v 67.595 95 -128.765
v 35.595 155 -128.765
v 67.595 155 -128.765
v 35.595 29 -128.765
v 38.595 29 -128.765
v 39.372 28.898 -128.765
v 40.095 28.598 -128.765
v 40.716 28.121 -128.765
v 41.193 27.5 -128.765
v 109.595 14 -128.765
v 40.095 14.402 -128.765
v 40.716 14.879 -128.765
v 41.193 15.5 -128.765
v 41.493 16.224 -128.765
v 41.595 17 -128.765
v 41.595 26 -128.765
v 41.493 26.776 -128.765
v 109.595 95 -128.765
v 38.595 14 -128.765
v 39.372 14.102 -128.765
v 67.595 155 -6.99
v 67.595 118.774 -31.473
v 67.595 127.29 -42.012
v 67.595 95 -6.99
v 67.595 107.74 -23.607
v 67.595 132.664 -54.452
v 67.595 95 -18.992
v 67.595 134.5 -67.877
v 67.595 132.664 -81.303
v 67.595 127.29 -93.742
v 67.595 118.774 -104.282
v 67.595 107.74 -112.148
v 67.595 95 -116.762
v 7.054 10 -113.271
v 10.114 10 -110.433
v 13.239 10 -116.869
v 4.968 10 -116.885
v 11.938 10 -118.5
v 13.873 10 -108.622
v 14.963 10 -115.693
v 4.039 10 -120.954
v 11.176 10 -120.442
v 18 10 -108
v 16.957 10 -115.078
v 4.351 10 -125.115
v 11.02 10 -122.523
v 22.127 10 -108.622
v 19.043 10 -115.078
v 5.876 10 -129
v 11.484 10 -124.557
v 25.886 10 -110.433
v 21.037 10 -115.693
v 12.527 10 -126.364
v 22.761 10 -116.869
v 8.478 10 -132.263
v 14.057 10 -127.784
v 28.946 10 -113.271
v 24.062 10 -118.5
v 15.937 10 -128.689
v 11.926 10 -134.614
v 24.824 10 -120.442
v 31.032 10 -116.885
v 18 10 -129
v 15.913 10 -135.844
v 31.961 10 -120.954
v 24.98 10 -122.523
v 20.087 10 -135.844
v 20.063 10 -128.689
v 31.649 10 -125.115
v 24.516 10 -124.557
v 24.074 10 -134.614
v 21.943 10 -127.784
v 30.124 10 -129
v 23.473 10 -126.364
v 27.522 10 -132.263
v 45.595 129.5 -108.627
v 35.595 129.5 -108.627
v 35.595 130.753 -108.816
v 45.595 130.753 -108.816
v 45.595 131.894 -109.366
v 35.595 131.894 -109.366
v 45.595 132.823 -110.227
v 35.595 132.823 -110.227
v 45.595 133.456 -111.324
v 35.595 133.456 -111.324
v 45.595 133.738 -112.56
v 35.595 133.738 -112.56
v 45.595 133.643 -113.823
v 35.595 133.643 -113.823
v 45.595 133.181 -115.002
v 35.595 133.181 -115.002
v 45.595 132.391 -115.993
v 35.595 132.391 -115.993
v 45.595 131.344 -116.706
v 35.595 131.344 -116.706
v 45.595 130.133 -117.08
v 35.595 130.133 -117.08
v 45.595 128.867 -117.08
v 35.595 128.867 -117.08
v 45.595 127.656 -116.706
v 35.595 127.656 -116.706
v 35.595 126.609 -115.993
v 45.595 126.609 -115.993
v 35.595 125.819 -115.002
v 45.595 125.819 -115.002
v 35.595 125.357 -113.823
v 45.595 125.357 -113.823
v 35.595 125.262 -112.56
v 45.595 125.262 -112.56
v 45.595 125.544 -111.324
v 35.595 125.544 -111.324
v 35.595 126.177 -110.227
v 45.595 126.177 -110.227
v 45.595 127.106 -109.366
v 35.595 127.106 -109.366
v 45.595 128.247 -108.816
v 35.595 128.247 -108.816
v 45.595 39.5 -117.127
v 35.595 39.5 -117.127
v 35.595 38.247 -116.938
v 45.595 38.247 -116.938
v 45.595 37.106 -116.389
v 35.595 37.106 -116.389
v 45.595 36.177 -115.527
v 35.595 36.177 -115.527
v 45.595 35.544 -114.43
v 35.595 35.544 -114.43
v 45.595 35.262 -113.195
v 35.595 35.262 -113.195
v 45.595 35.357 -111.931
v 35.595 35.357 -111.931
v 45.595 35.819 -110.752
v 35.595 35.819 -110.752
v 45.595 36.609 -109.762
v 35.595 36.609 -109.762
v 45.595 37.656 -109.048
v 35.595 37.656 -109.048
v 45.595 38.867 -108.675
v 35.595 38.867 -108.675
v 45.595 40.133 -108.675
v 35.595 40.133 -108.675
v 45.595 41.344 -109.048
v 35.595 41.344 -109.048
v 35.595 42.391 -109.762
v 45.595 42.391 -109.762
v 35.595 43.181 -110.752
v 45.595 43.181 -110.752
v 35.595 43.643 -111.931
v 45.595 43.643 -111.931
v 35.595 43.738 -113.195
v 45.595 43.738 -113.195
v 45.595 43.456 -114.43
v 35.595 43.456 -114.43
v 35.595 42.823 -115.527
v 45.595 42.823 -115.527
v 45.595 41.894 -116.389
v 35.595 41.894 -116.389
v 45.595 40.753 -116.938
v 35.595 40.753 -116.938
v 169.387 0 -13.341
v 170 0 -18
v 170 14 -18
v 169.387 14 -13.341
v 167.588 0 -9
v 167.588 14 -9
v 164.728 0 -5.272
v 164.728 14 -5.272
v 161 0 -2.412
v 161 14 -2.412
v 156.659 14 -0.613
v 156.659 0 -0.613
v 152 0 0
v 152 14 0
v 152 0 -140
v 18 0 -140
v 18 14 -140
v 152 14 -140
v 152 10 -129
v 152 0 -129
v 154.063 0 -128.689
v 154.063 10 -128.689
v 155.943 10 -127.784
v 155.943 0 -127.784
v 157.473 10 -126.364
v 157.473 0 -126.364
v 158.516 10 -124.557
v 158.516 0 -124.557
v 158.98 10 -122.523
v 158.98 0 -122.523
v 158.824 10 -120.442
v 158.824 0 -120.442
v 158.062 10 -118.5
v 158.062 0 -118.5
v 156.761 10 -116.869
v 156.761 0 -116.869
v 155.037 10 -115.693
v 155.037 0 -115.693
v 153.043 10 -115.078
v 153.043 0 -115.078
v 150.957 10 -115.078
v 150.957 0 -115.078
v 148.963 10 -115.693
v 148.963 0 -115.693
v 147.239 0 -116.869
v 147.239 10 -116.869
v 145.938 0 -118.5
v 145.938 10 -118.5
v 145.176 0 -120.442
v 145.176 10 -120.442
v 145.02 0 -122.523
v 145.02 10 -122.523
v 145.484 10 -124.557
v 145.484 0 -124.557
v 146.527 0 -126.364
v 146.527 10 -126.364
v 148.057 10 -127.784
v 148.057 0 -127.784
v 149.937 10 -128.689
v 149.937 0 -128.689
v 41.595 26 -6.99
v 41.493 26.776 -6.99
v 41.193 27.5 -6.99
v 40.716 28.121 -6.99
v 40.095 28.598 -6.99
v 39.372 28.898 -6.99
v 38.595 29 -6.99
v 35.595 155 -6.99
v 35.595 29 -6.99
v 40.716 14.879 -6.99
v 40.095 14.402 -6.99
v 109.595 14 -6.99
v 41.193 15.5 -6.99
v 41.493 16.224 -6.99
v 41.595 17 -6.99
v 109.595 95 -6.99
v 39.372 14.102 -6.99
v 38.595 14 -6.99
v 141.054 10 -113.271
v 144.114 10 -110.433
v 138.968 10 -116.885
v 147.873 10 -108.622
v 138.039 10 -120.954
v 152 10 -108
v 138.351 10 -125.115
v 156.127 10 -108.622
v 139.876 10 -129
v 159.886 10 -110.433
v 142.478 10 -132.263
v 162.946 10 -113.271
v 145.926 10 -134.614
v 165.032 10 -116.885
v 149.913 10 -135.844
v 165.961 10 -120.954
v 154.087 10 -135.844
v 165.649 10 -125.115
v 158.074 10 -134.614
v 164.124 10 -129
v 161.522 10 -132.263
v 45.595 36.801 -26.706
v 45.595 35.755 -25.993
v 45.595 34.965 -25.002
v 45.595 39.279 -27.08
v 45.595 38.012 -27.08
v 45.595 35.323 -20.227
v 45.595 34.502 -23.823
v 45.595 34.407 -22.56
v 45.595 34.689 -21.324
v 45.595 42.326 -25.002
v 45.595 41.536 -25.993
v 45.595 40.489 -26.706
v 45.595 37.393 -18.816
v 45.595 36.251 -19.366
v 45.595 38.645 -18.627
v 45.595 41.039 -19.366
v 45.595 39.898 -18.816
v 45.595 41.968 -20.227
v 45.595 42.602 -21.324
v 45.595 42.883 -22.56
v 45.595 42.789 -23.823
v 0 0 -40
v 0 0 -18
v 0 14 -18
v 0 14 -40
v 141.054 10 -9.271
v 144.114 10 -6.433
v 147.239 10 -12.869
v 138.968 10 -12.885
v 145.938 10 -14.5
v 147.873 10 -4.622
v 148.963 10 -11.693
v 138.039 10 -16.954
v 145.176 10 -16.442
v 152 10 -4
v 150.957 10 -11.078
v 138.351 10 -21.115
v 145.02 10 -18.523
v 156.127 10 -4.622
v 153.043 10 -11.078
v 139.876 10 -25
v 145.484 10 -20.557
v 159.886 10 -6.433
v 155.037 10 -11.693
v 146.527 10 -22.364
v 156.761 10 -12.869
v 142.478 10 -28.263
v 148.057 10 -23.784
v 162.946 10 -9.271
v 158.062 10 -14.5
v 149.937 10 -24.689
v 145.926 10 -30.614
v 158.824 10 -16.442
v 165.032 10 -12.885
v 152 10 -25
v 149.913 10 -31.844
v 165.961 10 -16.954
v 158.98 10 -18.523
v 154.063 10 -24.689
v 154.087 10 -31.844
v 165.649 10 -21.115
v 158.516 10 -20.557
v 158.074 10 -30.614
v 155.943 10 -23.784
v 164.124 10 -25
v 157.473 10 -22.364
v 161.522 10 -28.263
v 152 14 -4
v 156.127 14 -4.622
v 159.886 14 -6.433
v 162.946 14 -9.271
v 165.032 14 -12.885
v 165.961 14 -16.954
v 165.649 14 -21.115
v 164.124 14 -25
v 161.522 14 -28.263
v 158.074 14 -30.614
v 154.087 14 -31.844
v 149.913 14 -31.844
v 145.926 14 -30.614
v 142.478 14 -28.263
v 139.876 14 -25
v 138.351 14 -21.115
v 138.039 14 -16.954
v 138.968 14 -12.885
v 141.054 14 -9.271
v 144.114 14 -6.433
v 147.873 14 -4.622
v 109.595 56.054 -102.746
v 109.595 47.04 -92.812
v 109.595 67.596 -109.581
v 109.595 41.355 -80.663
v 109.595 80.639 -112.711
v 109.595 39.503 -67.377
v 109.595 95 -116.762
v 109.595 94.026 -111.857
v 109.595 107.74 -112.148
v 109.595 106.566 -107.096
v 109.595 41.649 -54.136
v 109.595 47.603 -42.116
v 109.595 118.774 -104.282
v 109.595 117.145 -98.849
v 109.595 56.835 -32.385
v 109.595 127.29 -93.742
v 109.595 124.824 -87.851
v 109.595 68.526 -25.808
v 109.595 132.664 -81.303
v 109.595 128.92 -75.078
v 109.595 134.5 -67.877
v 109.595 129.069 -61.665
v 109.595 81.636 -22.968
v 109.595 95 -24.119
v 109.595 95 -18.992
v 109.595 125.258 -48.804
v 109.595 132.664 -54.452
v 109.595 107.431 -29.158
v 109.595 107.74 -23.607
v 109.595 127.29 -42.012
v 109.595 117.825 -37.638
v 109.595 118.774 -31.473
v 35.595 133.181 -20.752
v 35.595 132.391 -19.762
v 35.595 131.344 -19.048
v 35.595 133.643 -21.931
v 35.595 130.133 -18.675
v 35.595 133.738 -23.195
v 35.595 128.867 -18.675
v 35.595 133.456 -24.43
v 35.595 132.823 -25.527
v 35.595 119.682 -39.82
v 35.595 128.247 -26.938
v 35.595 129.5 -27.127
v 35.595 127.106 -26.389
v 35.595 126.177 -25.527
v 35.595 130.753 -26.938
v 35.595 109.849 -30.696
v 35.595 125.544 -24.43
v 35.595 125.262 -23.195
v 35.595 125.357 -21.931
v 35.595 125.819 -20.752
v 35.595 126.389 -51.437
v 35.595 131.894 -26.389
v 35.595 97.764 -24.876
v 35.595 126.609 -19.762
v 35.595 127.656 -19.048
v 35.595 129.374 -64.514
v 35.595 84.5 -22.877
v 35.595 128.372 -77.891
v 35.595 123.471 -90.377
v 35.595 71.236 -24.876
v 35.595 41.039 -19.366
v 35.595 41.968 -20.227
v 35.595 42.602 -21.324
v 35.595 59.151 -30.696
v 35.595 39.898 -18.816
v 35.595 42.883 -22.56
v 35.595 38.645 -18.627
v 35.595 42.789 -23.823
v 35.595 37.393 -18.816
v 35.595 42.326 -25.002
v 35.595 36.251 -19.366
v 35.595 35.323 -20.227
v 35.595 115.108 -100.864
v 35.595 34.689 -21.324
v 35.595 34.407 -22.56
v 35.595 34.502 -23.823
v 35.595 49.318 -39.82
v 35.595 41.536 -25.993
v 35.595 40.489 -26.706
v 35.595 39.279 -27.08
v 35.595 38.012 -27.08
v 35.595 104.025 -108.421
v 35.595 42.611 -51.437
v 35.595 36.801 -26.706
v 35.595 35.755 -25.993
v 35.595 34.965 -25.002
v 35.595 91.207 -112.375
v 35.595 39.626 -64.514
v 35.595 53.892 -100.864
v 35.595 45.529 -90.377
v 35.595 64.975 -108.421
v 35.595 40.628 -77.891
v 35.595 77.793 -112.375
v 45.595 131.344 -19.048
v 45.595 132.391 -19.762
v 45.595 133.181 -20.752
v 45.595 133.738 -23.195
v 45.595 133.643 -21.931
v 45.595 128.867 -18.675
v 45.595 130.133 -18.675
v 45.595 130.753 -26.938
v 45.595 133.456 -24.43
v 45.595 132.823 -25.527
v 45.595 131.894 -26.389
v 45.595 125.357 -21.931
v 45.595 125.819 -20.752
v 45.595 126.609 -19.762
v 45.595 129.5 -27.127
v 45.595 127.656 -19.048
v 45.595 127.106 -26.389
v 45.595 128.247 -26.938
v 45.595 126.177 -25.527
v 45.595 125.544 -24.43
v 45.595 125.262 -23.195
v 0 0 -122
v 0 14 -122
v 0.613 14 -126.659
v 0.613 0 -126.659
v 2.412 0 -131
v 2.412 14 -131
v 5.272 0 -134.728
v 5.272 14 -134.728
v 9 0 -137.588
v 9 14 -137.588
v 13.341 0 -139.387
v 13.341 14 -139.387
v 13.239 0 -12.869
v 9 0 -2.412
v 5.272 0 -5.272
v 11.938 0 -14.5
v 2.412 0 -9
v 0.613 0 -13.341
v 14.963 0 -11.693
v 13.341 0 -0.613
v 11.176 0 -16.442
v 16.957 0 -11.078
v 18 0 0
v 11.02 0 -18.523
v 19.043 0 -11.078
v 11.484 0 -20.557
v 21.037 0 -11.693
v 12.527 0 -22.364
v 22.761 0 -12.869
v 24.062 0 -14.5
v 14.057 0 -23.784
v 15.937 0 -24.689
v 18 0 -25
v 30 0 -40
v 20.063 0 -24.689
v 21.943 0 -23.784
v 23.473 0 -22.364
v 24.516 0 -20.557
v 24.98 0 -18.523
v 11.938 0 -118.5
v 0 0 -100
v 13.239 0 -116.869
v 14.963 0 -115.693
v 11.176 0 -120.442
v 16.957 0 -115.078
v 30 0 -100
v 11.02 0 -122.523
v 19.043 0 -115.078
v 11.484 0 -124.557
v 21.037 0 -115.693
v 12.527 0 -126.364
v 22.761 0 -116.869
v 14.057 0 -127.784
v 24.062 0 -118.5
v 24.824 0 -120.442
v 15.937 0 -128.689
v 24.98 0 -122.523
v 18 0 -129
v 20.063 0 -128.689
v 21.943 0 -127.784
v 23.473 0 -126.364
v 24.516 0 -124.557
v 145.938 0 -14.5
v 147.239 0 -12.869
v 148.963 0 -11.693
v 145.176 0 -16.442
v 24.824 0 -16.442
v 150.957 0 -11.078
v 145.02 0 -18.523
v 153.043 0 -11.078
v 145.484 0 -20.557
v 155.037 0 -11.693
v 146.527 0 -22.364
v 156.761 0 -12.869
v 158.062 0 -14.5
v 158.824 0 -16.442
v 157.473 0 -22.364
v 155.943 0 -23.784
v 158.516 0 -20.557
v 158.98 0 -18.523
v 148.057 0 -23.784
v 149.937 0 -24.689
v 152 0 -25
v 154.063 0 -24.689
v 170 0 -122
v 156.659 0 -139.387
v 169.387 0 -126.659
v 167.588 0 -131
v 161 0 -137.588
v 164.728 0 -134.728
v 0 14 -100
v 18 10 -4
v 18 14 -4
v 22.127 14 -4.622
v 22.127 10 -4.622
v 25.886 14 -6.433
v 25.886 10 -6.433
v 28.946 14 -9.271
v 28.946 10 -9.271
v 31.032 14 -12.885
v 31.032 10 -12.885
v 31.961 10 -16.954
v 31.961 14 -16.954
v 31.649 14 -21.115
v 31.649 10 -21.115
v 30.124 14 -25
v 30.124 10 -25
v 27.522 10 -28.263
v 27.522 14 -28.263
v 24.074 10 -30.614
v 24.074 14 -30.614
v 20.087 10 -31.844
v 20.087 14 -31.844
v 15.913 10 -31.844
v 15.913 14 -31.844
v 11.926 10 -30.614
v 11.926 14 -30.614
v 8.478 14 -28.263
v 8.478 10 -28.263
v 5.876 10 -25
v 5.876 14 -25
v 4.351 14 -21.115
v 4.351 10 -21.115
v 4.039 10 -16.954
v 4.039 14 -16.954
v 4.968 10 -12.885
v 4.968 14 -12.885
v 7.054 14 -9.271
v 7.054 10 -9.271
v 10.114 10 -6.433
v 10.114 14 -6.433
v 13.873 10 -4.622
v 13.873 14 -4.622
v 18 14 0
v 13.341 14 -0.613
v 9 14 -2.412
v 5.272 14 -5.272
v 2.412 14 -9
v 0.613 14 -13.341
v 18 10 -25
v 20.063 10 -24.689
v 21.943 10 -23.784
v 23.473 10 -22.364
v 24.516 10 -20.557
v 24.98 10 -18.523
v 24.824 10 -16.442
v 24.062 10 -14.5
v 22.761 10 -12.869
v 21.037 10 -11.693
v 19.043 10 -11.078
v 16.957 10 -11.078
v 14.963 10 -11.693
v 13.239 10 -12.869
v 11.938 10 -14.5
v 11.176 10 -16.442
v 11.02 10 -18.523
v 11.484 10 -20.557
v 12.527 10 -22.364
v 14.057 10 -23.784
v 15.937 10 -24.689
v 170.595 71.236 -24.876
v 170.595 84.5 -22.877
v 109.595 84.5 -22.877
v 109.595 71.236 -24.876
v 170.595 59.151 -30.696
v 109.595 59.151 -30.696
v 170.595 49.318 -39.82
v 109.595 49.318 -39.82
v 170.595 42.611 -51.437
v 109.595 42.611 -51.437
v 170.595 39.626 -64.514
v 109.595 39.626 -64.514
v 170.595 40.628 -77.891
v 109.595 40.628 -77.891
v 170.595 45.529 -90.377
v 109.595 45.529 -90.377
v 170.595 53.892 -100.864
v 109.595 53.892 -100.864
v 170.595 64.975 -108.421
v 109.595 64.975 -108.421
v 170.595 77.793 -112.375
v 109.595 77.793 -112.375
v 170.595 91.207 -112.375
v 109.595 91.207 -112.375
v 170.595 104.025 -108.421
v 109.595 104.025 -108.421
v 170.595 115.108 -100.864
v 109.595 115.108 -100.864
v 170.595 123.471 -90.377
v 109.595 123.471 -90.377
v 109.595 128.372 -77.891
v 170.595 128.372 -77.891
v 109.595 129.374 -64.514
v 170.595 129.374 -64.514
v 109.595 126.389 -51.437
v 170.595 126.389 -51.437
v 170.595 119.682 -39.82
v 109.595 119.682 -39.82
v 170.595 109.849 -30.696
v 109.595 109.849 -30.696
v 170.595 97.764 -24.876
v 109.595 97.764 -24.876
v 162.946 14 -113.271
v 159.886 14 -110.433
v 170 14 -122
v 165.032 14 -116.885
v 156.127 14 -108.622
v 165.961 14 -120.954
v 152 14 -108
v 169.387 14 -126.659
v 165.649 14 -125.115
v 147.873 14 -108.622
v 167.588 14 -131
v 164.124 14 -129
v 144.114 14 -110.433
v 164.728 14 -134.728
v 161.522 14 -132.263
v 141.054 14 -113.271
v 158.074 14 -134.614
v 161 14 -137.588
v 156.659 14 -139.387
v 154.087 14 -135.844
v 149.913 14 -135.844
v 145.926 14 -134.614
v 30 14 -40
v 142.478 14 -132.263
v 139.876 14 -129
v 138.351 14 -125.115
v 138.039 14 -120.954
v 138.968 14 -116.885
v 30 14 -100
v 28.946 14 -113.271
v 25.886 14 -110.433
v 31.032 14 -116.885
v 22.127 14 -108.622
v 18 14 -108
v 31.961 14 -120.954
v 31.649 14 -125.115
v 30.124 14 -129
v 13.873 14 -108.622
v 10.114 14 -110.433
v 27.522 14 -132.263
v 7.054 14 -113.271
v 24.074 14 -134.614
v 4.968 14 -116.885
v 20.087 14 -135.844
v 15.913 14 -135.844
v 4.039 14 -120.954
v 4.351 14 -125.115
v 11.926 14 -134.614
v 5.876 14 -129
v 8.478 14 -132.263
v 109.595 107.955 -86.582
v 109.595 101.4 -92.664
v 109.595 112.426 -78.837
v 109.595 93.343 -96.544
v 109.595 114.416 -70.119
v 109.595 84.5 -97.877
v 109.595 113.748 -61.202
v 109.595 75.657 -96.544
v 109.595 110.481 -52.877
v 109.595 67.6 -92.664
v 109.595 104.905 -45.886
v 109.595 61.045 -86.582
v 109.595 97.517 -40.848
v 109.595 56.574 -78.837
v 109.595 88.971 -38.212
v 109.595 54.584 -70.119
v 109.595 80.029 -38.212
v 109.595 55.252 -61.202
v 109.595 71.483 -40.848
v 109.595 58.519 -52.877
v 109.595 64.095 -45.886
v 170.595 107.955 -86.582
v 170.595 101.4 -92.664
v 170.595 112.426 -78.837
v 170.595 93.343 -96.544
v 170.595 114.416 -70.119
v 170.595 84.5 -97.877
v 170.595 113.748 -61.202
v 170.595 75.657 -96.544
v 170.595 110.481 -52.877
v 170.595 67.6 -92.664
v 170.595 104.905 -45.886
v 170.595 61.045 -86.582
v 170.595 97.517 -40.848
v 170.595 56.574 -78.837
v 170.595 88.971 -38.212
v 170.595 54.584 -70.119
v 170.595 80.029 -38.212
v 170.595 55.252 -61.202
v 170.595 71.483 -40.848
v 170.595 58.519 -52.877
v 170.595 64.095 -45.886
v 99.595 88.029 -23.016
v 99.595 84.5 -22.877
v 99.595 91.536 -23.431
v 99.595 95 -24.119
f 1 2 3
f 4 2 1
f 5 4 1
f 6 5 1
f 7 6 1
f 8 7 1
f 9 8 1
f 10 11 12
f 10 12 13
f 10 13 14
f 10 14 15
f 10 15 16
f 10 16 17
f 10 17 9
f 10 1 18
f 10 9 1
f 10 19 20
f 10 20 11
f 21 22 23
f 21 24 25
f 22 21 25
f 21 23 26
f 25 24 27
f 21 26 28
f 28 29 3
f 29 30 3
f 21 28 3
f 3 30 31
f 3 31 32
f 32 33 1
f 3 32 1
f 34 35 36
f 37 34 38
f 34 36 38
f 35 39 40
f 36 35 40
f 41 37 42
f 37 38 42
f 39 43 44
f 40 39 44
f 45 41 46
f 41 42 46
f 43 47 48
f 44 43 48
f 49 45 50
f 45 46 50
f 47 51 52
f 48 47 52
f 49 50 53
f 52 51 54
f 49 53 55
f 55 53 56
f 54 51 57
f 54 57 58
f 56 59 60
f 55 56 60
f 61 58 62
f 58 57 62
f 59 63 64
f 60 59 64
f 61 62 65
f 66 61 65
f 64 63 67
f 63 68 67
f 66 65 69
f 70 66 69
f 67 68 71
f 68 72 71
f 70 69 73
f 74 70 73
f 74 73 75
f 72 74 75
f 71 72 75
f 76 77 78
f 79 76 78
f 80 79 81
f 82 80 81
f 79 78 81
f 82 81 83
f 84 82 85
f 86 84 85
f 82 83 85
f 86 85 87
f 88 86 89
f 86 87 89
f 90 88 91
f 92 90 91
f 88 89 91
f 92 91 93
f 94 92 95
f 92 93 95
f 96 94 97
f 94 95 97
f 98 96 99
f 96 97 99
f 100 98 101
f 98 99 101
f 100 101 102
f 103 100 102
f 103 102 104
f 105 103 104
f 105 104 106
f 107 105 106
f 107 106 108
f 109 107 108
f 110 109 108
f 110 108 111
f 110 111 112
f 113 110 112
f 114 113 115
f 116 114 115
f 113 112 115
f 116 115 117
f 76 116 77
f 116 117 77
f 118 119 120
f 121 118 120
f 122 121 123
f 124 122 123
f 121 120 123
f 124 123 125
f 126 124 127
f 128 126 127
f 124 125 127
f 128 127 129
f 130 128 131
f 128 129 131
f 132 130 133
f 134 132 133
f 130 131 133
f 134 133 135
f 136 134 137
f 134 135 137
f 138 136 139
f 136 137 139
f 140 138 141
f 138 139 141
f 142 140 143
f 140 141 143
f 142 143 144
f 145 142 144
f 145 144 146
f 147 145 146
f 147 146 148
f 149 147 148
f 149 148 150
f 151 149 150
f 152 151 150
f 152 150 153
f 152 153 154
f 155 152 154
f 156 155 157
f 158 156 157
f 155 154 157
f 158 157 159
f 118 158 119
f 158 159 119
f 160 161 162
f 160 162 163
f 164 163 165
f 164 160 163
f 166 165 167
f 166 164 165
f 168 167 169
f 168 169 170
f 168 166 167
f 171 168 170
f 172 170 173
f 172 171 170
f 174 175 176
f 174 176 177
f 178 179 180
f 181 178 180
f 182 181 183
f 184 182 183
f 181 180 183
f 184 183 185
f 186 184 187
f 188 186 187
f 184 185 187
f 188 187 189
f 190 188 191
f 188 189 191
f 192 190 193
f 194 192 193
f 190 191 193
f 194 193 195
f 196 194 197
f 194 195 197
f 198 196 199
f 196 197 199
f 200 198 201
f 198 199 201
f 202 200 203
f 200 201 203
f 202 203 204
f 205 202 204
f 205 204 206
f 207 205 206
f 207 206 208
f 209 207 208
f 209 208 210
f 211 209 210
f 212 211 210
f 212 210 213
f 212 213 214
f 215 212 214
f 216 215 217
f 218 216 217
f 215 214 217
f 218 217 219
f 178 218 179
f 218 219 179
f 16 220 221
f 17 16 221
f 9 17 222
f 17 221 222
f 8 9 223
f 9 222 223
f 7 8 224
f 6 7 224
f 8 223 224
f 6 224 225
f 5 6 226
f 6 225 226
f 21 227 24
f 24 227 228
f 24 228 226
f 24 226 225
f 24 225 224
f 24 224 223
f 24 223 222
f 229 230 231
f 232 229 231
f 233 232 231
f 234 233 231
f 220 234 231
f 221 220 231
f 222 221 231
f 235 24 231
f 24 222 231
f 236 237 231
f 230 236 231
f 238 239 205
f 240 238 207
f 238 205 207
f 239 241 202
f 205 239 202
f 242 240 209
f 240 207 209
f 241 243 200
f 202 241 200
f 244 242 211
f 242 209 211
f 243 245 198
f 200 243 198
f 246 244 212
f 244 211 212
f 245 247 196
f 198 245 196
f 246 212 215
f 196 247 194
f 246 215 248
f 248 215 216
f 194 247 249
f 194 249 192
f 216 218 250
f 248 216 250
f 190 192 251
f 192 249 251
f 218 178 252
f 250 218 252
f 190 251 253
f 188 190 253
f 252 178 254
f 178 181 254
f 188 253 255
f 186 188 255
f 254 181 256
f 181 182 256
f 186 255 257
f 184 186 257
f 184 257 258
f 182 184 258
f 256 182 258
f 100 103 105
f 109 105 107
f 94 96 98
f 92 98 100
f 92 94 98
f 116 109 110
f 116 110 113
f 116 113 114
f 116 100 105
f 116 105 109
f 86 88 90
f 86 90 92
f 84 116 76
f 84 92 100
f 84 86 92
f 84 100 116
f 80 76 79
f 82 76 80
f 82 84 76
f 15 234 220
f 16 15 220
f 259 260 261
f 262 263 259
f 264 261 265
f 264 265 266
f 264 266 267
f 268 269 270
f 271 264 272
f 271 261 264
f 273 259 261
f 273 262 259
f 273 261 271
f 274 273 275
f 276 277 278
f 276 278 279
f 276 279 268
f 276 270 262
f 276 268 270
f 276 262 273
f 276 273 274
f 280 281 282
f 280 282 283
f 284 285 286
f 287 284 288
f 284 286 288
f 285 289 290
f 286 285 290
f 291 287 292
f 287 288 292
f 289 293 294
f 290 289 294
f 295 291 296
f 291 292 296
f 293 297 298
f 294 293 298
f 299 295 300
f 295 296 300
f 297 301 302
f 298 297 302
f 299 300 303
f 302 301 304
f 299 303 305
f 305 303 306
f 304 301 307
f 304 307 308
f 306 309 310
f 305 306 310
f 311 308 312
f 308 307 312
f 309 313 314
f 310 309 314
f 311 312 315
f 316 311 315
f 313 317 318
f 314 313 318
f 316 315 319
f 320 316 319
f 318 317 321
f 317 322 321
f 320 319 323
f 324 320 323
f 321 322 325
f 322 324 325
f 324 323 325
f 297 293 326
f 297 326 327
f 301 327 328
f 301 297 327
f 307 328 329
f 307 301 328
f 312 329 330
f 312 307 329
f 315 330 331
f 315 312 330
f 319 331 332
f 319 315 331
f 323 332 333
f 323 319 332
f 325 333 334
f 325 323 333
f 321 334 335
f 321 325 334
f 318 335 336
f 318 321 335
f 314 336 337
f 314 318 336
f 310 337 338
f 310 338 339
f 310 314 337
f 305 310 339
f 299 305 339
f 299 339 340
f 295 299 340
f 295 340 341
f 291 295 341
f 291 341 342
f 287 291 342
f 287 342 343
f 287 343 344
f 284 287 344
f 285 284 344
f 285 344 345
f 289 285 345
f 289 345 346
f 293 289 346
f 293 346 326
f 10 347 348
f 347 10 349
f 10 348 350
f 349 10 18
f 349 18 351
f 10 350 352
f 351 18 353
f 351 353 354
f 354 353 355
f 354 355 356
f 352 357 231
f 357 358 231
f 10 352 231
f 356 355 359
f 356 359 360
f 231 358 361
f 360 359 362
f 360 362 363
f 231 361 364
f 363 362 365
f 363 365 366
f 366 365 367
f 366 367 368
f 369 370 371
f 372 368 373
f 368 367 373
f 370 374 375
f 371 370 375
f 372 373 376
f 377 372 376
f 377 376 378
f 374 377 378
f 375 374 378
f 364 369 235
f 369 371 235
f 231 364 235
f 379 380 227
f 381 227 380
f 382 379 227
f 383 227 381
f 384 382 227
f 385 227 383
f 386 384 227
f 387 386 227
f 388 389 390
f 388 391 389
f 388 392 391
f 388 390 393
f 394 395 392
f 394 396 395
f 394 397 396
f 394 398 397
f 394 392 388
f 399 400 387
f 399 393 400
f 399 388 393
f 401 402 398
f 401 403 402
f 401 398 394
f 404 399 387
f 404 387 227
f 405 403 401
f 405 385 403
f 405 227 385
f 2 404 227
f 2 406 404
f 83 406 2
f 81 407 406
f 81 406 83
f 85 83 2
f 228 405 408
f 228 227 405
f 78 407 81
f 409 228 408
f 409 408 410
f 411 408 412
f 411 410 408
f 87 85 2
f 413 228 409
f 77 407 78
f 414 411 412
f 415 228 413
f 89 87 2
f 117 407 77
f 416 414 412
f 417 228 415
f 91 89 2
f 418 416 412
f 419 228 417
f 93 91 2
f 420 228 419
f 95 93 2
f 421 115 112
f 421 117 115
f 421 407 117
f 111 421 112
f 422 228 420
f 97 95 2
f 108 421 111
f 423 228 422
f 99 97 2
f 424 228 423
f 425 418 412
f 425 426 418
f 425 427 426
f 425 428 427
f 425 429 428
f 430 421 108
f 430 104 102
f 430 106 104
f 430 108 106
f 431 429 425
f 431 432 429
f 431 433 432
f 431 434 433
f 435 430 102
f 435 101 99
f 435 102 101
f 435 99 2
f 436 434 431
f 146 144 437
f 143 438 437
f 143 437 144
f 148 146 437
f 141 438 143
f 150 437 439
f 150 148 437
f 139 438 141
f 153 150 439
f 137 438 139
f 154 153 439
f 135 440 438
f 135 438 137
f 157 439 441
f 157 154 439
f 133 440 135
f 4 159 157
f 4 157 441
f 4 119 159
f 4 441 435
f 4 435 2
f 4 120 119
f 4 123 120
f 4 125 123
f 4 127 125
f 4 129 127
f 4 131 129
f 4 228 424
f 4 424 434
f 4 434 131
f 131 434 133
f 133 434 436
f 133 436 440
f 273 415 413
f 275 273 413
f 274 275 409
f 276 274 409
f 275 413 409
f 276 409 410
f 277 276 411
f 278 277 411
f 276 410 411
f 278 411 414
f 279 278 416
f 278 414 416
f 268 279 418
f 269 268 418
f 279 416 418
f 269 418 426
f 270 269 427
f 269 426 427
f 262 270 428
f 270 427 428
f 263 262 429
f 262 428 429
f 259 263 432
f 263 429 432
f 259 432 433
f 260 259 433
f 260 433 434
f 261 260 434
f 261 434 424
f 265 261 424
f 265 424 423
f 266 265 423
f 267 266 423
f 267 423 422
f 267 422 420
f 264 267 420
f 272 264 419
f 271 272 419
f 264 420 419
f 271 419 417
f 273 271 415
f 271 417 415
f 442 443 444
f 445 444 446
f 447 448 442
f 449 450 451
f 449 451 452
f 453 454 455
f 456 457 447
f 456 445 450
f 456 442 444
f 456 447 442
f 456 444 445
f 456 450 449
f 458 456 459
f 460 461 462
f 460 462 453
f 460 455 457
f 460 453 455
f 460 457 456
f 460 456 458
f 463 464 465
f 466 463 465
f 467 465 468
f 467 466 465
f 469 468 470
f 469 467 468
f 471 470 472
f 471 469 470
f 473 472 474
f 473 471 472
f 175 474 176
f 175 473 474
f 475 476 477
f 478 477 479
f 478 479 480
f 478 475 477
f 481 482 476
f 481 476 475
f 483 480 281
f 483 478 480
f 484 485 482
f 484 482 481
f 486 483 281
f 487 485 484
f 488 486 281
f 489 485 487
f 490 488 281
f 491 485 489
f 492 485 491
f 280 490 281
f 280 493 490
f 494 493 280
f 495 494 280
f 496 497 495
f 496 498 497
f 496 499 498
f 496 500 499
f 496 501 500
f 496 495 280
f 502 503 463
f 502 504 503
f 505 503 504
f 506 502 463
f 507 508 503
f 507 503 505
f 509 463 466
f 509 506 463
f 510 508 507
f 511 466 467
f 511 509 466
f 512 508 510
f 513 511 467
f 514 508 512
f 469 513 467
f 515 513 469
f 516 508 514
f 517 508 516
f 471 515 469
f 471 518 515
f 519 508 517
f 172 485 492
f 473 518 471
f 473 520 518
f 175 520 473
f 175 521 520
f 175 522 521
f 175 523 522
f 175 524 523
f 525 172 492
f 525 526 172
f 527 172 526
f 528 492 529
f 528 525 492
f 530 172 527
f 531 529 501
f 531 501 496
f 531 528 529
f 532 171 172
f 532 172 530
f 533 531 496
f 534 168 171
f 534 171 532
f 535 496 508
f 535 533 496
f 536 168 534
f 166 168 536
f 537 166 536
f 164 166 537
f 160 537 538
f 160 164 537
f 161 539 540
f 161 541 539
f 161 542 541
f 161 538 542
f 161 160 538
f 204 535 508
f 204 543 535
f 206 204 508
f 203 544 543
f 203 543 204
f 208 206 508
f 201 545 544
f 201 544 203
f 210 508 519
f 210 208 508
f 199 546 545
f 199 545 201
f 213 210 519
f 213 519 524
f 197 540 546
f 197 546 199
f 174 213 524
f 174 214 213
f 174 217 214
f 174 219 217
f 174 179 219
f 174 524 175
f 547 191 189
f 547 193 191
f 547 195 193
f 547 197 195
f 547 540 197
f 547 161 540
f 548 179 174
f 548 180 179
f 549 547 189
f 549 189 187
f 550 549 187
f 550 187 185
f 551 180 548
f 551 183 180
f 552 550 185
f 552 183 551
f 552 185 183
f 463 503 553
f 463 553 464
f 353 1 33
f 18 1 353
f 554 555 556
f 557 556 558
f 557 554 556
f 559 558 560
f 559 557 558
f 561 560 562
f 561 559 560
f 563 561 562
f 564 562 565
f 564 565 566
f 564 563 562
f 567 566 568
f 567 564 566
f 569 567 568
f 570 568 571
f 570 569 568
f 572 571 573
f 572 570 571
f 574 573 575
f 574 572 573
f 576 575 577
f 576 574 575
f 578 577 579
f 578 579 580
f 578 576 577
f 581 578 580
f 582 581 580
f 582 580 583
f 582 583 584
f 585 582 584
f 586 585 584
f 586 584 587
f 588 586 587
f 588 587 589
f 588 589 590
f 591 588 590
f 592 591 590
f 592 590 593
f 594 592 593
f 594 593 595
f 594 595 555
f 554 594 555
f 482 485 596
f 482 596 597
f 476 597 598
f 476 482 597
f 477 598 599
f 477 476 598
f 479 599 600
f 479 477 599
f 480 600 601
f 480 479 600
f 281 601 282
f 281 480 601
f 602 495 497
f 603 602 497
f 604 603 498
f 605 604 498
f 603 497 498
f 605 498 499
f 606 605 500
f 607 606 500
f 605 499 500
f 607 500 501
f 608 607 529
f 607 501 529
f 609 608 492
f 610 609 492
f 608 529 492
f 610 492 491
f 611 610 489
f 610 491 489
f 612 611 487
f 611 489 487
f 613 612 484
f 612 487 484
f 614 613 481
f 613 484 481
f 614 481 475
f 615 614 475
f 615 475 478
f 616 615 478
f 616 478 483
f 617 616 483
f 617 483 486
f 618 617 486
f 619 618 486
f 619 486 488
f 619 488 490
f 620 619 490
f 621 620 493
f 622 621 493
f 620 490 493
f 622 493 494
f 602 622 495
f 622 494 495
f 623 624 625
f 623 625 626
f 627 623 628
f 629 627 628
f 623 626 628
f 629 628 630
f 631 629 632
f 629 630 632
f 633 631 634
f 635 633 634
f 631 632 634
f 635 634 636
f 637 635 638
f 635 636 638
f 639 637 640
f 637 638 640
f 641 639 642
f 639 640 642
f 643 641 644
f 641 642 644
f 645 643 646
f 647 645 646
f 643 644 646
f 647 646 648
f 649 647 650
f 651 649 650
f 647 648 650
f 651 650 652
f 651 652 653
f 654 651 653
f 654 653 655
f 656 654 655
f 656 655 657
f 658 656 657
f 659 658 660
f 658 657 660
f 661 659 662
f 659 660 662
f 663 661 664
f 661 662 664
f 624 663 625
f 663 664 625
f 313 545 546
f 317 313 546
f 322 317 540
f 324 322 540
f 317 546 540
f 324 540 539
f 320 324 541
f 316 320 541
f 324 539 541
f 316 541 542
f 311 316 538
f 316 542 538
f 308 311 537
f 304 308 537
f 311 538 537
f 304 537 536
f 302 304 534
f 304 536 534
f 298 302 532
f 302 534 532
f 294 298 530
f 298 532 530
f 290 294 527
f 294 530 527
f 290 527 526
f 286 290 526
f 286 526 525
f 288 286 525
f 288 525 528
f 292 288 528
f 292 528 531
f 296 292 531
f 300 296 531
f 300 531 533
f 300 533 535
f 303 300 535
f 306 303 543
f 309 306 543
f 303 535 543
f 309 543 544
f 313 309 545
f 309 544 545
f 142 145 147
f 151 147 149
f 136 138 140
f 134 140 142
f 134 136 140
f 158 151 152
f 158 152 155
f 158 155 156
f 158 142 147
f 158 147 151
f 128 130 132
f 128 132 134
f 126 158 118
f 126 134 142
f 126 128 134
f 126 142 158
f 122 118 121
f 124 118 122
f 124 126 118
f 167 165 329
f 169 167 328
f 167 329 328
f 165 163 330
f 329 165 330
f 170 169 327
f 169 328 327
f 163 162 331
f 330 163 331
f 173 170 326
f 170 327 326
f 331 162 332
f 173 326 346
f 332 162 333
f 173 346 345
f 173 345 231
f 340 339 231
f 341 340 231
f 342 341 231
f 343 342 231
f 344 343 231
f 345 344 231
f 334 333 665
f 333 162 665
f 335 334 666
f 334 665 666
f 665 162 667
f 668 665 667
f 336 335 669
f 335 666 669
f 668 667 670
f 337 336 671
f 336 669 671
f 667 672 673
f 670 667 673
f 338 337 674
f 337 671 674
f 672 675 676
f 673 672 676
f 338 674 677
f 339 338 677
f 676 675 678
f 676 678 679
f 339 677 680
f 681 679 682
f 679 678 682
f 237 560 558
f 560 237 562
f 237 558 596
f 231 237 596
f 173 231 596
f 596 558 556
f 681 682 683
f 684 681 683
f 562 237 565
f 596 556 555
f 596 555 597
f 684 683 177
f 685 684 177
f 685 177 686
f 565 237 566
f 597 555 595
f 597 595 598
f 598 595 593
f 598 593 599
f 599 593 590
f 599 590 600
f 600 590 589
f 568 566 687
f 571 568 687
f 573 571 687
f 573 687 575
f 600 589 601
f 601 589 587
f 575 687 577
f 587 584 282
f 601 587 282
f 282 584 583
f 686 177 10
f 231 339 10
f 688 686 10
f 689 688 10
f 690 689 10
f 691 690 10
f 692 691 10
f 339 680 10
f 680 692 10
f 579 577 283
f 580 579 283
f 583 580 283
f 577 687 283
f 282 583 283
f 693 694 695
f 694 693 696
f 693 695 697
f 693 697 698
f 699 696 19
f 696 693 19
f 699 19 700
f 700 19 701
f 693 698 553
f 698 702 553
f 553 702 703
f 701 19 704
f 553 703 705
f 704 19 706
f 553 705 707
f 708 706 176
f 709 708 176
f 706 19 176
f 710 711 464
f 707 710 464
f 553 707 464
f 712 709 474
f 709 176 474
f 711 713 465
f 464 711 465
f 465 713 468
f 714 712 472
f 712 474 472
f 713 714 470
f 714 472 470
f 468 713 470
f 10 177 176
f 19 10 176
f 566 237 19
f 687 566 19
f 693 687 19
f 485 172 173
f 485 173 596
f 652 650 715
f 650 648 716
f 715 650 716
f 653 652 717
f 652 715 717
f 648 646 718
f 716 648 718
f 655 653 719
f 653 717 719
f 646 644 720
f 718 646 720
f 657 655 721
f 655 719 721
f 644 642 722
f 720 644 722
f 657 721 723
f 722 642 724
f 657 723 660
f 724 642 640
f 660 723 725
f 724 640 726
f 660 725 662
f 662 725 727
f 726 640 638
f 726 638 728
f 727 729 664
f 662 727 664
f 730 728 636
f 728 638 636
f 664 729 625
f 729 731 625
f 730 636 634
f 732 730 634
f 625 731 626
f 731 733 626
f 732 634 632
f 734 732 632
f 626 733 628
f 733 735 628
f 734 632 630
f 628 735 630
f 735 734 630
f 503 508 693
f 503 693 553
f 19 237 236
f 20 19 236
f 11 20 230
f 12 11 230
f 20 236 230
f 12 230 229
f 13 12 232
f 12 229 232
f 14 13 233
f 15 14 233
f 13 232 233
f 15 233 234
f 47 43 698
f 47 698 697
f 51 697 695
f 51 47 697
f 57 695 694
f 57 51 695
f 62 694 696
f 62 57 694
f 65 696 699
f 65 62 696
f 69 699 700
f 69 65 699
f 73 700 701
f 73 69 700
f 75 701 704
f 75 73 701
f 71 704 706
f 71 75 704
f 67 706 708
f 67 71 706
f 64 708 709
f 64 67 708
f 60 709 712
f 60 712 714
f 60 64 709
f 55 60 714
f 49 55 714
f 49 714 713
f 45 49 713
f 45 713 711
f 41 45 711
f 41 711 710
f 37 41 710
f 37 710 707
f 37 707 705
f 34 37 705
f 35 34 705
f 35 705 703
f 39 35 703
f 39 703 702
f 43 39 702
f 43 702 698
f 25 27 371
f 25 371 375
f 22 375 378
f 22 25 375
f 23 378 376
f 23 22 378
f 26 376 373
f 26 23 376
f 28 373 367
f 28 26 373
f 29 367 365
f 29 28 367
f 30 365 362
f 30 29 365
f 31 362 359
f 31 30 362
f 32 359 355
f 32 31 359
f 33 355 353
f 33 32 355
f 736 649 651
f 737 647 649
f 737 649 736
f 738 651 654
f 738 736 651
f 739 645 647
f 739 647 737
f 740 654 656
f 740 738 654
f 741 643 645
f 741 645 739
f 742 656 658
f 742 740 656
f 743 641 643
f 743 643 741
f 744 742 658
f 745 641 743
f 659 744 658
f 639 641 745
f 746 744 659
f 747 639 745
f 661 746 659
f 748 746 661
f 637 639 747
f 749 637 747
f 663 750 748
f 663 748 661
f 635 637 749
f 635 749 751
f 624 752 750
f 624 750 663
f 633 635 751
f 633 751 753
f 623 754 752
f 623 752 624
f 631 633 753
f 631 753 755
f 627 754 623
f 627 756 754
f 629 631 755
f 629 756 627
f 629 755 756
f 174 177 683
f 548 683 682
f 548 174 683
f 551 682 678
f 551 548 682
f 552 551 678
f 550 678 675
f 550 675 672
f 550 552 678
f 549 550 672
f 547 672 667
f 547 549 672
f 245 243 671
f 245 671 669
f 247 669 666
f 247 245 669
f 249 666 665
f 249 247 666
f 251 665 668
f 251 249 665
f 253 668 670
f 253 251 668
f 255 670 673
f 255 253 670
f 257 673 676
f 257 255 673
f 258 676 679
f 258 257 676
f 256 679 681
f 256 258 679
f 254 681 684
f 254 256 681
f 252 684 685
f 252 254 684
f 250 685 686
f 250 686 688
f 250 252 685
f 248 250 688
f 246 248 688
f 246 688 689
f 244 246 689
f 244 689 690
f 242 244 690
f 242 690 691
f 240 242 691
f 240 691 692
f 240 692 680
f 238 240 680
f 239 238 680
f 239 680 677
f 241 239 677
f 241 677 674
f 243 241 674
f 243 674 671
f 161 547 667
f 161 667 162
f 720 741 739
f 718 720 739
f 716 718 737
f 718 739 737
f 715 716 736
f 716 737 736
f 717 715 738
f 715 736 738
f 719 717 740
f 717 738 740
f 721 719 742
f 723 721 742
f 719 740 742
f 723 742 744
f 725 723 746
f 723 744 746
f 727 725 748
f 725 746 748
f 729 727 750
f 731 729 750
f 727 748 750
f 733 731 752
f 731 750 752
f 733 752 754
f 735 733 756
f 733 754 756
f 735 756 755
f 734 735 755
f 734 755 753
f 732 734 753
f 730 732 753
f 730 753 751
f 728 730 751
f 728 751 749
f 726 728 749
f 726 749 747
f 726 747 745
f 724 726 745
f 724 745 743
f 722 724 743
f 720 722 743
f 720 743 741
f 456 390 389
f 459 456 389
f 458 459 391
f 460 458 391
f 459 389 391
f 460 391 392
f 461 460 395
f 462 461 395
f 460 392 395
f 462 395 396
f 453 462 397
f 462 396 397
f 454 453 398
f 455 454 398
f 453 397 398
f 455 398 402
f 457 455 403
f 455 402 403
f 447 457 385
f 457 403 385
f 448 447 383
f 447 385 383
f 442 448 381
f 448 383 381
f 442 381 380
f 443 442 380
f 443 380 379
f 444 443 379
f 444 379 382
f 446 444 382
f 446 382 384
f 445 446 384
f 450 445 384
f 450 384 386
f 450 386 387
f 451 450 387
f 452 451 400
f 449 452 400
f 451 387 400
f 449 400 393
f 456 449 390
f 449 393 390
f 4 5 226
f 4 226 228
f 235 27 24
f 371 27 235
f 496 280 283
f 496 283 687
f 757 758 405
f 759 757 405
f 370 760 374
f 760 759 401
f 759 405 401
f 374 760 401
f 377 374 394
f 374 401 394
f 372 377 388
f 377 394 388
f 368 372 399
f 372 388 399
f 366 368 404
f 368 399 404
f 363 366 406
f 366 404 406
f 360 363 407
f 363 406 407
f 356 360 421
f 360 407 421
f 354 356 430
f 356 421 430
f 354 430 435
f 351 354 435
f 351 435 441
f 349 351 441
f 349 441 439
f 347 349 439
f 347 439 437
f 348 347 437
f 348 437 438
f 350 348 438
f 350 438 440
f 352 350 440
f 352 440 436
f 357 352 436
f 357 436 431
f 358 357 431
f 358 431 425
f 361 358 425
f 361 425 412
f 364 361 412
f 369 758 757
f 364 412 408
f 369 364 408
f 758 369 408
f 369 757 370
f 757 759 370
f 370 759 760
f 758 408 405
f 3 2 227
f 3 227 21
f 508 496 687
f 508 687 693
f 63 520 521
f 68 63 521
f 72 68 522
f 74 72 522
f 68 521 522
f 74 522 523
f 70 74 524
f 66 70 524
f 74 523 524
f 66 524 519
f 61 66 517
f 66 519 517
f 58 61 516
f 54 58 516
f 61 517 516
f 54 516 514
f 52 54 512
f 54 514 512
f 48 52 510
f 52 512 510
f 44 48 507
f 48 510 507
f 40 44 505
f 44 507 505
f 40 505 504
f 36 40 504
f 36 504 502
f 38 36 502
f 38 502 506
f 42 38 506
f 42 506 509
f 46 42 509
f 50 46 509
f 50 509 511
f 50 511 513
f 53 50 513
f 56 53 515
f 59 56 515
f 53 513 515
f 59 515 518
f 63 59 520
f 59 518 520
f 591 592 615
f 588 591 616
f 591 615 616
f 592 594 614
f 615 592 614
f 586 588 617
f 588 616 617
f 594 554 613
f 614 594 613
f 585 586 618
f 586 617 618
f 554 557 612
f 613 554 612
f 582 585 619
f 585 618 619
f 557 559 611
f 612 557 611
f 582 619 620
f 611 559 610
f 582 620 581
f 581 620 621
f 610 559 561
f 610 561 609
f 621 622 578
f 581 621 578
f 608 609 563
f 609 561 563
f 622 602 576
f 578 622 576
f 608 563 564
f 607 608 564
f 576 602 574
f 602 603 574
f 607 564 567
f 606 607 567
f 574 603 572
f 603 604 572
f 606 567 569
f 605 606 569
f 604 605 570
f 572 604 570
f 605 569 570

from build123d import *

# Parameters (mm, degrees)
SKETCH1_R            = 14
BOSS_EXTRUDE2_DEPTH  = 14
SKETCH5_W            = 32
SKETCH5_H            = 121.775184507
BOSS_EXTRUDE4_DEPTH  = 141
SKETCH7_W            = 42
SKETCH7_H            = 121.775184507
BOSS_EXTRUDE5_DEPTH  = 81
SKETCH8_R            = 45
CUT_EXTRUDE1_DEPTH   = 81
SKETCH9_R            = 50
CUT_EXTRUDE2_DEPTH   = 64
SKETCH10_R           = 50
SKETCH10_R_2         = 45
BOSS_EXTRUDE7_DEPTH  = 74
SKETCH12_R           = 45
BOSS_EXTRUDE8_DEPTH  = 61
SKETCH14_R           = 30
CUT_EXTRUDE3_DEPTH   = 108
CUT_EXTRUDE10_DEPTH  = 151
SKETCH21_R           = 4.25
CUT_EXTRUDE11_DEPTH  = 10
SKETCH22_R           = 14
SKETCH22_R_2         = 7
BOSS_EXTRUDE11_DEPTH = 10


with BuildPart() as part:
    # Sketch1 → Boss-Extrude2 (new body)
    with BuildSketch(Plane(origin=(0, 0, 0), x_dir=(1, 0, 0), z_dir=(0, 1, 0))):
        with BuildLine():
            ThreePointArc((152, 140), (164.727922061, 134.727922061), (170, 122))
            Line((170, 122), (170, 18))
            ThreePointArc((170, 18), (164.727922061, 5.272077939), (152, 0))
            Line((152, 0), (18, 0))
            ThreePointArc((18, 0), (5.272077939, 5.272077939), (0, 18))
            Line((0, 18), (0, 40))
            Line((0, 40), (30, 40))
            Line((30, 40), (30, 100))
            Line((30, 100), (0, 100))
            Line((0, 100), (0, 122))
            ThreePointArc((0, 122), (5.272077939, 134.727922061), (18, 140))
            Line((18, 140), (152, 140))
        make_face()
        with Locations(Location((18, 18, 0), (0, 0, 270))):
            Circle(SKETCH1_R, mode=Mode.SUBTRACT)
        with Locations(Location((152, 18, 0), (0, 0, 270))):
            Circle(SKETCH1_R, mode=Mode.SUBTRACT)
        with Locations(Location((152, 122, 0), (0, 0, 270))):
            Circle(SKETCH1_R, mode=Mode.SUBTRACT)
        with Locations(Location((18, 122, 0), (0, 0, 270))):
            Circle(SKETCH1_R, mode=Mode.SUBTRACT)
    extrude(amount=BOSS_EXTRUDE2_DEPTH)

    # Sketch5 → Boss-Extrude4 (add)
    with BuildSketch(Plane(origin=(0, 14, 0), x_dir=(1, 0, 0), z_dir=(0, 1, 0))):
        with Locations((51.595170786, 67.877136245)):
            Rectangle(SKETCH5_W, SKETCH5_H)
    extrude(amount=BOSS_EXTRUDE4_DEPTH)

    # Sketch7 → Boss-Extrude5 (add)
    with BuildSketch(Plane(origin=(0, 14, 0), x_dir=(1, 0, 0), z_dir=(0, 1, 0))):
        with Locations((88.595170786, 67.877136245)):
            Rectangle(SKETCH7_W, SKETCH7_H)
    extrude(amount=BOSS_EXTRUDE5_DEPTH)

    # Sketch8 → Cut-Extrude1 (cut)
    with BuildSketch(Plane.ZY.offset(-35.595170786)):
        with Locations((-67.877136245, 84.5)):
            Circle(SKETCH8_R)
    extrude(amount=-CUT_EXTRUDE1_DEPTH, mode=Mode.SUBTRACT)

    # Sketch9 → Cut-Extrude2 (cut)
    with BuildSketch(Plane.ZY.offset(-35.595170786)):
        with Locations((-67.877136245, 84.5)):
            Circle(SKETCH9_R)
    extrude(amount=-CUT_EXTRUDE2_DEPTH, mode=Mode.SUBTRACT)

    # Sketch10 → Boss-Extrude7 (add)
    with BuildSketch(Plane.ZY.offset(-35.595170786)):
        with Locations((-67.877136245, 84.5)):
            Circle(SKETCH10_R)
        with Locations((-67.877136245, 84.5)):
            Circle(SKETCH10_R_2, mode=Mode.SUBTRACT)
    extrude(amount=-BOSS_EXTRUDE7_DEPTH)

    # Sketch16 → Cut-Extrude10 (cut)
    with BuildSketch(Plane.XY.offset(-6.989543991)):
        with BuildLine():
            Line((41.595170786, 17), (41.595170786, 26))
            ThreePointArc((41.595170786, 26), (40.71649113, 28.121320344), (38.595170786, 29))
            Line((38.595170786, 29), (35.595170786, 29))
            Line((35.595170786, 29), (35.595170786, 14))
            Line((35.595170786, 14), (38.595170786, 14))
            ThreePointArc((38.595170786, 14), (40.71649113, 14.878679656), (41.595170786, 17))
        make_face()
    extrude(amount=-CUT_EXTRUDE10_DEPTH, mode=Mode.SUBTRACT)

    # Sketch21 → Cut-Extrude11 (cut)
    with BuildSketch(Plane.ZY.offset(-35.595170786)):
        with Locations((-112.877136245, 129.5)):
            Circle(SKETCH21_R)
        with Locations(Location((-112.877136245, 39.5, 0), (0, 0, 180))):
            Circle(SKETCH21_R)
        with Locations((-22.877136245, 38.645340566)):
            Circle(SKETCH21_R)
        with Locations(Location((-22.877136245, 129.5, 0), (0, 0, 180))):
            Circle(SKETCH21_R)
    extrude(amount=-CUT_EXTRUDE11_DEPTH, mode=Mode.SUBTRACT)

    # Sketch22 → Boss-Extrude11 (add)
    # profile 1 of 4: a face of its own
    with BuildSketch(Plane.XZ):
        with Locations(Location((18, -18, 0), (0, 0, 270))):
            Circle(SKETCH22_R)
        with Locations(Location((18, -18, 0), (0, 0, 270))):
            Circle(SKETCH22_R_2, mode=Mode.SUBTRACT)
    # profile 2 of 4: a face of its own
    with BuildSketch(Plane.XZ):
        with Locations(Location((152, -18, 0), (0, 0, 270))):
            Circle(SKETCH22_R)
        with Locations(Location((152, -18, 0), (0, 0, 270))):
            Circle(SKETCH22_R_2, mode=Mode.SUBTRACT)
    # profile 3 of 4: a face of its own
    with BuildSketch(Plane.XZ):
        with Locations(Location((18, -122, 0), (0, 0, 270))):
            Circle(SKETCH22_R)
        with Locations(Location((18, -122, 0), (0, 0, 270))):
            Circle(SKETCH22_R_2, mode=Mode.SUBTRACT)
    # profile 4 of 4: a face of its own
    with BuildSketch(Plane.XZ):
        with Locations(Location((152, -122, 0), (0, 0, 270))):
            Circle(SKETCH22_R)
        with Locations(Location((152, -122, 0), (0, 0, 270))):
            Circle(SKETCH22_R_2, mode=Mode.SUBTRACT)
    extrude(amount=-BOSS_EXTRUDE11_DEPTH)


with BuildPart() as body_2:
    # Sketch12 → Boss-Extrude8 (new body)
    with BuildSketch(Plane(origin=(109.595170786, 0, 0), x_dir=(0, 0, -1), z_dir=(1, 0, 0))):
        with Locations(Location((67.877136245, 84.5, 0), (0, 0, 180))):
            Circle(SKETCH12_R)
    extrude(amount=BOSS_EXTRUDE8_DEPTH)

    # Sketch14 → Cut-Extrude3 (cut)
    with BuildSketch(Plane(origin=(170.595170786, 0, 0), x_dir=(0, 0, -1), z_dir=(1, 0, 0))):
        with Locations((67.877136245, 84.5)):
            Circle(SKETCH14_R)
    extrude(amount=-CUT_EXTRUDE3_DEPTH, mode=Mode.SUBTRACT)


solid = Compound([part.part, body_2.part])
